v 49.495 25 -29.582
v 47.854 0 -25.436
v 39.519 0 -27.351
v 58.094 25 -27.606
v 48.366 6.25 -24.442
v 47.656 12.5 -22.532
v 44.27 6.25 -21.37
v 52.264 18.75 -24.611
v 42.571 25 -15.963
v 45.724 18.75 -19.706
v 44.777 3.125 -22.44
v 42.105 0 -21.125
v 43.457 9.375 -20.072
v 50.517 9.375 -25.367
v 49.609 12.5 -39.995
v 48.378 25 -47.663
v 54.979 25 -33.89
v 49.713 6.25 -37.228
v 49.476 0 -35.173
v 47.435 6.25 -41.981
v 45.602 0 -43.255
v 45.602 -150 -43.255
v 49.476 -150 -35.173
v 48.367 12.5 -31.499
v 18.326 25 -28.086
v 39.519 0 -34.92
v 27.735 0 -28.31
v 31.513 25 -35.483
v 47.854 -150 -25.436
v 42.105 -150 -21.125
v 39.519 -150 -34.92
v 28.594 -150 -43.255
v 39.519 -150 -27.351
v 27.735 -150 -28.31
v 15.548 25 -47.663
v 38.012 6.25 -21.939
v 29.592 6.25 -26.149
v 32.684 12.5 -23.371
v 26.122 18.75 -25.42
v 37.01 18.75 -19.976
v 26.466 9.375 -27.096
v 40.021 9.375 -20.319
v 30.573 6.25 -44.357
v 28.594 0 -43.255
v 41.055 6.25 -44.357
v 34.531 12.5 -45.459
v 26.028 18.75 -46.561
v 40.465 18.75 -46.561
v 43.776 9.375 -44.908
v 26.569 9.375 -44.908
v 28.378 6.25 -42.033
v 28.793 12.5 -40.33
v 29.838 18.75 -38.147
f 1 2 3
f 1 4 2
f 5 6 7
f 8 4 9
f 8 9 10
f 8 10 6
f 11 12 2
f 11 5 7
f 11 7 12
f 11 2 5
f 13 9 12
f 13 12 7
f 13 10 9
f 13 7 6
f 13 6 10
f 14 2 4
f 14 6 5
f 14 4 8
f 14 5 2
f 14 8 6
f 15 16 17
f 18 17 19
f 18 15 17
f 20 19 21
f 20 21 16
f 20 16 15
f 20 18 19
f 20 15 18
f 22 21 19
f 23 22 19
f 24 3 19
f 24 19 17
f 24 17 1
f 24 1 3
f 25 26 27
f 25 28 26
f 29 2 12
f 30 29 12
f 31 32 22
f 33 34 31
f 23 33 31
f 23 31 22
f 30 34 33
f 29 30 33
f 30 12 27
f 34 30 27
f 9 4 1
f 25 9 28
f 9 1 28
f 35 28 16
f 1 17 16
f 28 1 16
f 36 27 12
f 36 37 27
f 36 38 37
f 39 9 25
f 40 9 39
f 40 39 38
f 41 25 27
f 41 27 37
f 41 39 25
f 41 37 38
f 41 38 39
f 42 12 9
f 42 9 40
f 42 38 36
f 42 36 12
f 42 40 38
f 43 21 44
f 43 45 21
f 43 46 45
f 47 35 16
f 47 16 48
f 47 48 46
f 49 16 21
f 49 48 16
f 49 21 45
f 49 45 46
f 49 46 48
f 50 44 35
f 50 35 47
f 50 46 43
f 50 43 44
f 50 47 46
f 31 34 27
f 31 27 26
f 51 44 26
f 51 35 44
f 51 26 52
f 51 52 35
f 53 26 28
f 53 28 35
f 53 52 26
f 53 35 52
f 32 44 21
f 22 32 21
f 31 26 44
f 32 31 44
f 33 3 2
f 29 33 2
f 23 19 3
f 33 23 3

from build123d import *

# Parameters (mm, degrees)
F1_DEPTH = 150
F2_DEPTH = 25
F2_TAPER = -10


with BuildPart() as f1:
    # F0 (on Front) → F1 (new body)
    with BuildSketch(Plane.XZ):
        Polygon((47.8535592556, -25.4356767982), (42.105384171, -21.1245436221), (27.7349483222, -28.3097643405), (39.5187065005, -34.9201671779), (28.5936295986, -43.255019933), (45.6024929881, -43.255019933), (49.4760833681, -35.1725630462), (39.5187065005, -27.3510906845), align=None)
    extrude(amount=F1_DEPTH)

    # F1_face (on face) → F2 (join)
    with BuildSketch(Plane(origin=(39.6376889247, 0, -33.4798158905), x_dir=(1, 0, 0), z_dir=(0, 1, 0))):
        Polygon((2.4676952463, -12.3552722683), (8.2158703309, -8.0441390922), (-0.1189824242, -6.1287252059), (9.8383944433, 1.6927471558), (5.9648040634, 9.7752040425), (-11.0440593261, 9.7752040425), (-0.1189824242, 1.4403512875), (-11.9027406026, -5.1700515499), align=None)
    extrude(amount=F2_DEPTH, taper=F2_TAPER)


solid = f1.part
